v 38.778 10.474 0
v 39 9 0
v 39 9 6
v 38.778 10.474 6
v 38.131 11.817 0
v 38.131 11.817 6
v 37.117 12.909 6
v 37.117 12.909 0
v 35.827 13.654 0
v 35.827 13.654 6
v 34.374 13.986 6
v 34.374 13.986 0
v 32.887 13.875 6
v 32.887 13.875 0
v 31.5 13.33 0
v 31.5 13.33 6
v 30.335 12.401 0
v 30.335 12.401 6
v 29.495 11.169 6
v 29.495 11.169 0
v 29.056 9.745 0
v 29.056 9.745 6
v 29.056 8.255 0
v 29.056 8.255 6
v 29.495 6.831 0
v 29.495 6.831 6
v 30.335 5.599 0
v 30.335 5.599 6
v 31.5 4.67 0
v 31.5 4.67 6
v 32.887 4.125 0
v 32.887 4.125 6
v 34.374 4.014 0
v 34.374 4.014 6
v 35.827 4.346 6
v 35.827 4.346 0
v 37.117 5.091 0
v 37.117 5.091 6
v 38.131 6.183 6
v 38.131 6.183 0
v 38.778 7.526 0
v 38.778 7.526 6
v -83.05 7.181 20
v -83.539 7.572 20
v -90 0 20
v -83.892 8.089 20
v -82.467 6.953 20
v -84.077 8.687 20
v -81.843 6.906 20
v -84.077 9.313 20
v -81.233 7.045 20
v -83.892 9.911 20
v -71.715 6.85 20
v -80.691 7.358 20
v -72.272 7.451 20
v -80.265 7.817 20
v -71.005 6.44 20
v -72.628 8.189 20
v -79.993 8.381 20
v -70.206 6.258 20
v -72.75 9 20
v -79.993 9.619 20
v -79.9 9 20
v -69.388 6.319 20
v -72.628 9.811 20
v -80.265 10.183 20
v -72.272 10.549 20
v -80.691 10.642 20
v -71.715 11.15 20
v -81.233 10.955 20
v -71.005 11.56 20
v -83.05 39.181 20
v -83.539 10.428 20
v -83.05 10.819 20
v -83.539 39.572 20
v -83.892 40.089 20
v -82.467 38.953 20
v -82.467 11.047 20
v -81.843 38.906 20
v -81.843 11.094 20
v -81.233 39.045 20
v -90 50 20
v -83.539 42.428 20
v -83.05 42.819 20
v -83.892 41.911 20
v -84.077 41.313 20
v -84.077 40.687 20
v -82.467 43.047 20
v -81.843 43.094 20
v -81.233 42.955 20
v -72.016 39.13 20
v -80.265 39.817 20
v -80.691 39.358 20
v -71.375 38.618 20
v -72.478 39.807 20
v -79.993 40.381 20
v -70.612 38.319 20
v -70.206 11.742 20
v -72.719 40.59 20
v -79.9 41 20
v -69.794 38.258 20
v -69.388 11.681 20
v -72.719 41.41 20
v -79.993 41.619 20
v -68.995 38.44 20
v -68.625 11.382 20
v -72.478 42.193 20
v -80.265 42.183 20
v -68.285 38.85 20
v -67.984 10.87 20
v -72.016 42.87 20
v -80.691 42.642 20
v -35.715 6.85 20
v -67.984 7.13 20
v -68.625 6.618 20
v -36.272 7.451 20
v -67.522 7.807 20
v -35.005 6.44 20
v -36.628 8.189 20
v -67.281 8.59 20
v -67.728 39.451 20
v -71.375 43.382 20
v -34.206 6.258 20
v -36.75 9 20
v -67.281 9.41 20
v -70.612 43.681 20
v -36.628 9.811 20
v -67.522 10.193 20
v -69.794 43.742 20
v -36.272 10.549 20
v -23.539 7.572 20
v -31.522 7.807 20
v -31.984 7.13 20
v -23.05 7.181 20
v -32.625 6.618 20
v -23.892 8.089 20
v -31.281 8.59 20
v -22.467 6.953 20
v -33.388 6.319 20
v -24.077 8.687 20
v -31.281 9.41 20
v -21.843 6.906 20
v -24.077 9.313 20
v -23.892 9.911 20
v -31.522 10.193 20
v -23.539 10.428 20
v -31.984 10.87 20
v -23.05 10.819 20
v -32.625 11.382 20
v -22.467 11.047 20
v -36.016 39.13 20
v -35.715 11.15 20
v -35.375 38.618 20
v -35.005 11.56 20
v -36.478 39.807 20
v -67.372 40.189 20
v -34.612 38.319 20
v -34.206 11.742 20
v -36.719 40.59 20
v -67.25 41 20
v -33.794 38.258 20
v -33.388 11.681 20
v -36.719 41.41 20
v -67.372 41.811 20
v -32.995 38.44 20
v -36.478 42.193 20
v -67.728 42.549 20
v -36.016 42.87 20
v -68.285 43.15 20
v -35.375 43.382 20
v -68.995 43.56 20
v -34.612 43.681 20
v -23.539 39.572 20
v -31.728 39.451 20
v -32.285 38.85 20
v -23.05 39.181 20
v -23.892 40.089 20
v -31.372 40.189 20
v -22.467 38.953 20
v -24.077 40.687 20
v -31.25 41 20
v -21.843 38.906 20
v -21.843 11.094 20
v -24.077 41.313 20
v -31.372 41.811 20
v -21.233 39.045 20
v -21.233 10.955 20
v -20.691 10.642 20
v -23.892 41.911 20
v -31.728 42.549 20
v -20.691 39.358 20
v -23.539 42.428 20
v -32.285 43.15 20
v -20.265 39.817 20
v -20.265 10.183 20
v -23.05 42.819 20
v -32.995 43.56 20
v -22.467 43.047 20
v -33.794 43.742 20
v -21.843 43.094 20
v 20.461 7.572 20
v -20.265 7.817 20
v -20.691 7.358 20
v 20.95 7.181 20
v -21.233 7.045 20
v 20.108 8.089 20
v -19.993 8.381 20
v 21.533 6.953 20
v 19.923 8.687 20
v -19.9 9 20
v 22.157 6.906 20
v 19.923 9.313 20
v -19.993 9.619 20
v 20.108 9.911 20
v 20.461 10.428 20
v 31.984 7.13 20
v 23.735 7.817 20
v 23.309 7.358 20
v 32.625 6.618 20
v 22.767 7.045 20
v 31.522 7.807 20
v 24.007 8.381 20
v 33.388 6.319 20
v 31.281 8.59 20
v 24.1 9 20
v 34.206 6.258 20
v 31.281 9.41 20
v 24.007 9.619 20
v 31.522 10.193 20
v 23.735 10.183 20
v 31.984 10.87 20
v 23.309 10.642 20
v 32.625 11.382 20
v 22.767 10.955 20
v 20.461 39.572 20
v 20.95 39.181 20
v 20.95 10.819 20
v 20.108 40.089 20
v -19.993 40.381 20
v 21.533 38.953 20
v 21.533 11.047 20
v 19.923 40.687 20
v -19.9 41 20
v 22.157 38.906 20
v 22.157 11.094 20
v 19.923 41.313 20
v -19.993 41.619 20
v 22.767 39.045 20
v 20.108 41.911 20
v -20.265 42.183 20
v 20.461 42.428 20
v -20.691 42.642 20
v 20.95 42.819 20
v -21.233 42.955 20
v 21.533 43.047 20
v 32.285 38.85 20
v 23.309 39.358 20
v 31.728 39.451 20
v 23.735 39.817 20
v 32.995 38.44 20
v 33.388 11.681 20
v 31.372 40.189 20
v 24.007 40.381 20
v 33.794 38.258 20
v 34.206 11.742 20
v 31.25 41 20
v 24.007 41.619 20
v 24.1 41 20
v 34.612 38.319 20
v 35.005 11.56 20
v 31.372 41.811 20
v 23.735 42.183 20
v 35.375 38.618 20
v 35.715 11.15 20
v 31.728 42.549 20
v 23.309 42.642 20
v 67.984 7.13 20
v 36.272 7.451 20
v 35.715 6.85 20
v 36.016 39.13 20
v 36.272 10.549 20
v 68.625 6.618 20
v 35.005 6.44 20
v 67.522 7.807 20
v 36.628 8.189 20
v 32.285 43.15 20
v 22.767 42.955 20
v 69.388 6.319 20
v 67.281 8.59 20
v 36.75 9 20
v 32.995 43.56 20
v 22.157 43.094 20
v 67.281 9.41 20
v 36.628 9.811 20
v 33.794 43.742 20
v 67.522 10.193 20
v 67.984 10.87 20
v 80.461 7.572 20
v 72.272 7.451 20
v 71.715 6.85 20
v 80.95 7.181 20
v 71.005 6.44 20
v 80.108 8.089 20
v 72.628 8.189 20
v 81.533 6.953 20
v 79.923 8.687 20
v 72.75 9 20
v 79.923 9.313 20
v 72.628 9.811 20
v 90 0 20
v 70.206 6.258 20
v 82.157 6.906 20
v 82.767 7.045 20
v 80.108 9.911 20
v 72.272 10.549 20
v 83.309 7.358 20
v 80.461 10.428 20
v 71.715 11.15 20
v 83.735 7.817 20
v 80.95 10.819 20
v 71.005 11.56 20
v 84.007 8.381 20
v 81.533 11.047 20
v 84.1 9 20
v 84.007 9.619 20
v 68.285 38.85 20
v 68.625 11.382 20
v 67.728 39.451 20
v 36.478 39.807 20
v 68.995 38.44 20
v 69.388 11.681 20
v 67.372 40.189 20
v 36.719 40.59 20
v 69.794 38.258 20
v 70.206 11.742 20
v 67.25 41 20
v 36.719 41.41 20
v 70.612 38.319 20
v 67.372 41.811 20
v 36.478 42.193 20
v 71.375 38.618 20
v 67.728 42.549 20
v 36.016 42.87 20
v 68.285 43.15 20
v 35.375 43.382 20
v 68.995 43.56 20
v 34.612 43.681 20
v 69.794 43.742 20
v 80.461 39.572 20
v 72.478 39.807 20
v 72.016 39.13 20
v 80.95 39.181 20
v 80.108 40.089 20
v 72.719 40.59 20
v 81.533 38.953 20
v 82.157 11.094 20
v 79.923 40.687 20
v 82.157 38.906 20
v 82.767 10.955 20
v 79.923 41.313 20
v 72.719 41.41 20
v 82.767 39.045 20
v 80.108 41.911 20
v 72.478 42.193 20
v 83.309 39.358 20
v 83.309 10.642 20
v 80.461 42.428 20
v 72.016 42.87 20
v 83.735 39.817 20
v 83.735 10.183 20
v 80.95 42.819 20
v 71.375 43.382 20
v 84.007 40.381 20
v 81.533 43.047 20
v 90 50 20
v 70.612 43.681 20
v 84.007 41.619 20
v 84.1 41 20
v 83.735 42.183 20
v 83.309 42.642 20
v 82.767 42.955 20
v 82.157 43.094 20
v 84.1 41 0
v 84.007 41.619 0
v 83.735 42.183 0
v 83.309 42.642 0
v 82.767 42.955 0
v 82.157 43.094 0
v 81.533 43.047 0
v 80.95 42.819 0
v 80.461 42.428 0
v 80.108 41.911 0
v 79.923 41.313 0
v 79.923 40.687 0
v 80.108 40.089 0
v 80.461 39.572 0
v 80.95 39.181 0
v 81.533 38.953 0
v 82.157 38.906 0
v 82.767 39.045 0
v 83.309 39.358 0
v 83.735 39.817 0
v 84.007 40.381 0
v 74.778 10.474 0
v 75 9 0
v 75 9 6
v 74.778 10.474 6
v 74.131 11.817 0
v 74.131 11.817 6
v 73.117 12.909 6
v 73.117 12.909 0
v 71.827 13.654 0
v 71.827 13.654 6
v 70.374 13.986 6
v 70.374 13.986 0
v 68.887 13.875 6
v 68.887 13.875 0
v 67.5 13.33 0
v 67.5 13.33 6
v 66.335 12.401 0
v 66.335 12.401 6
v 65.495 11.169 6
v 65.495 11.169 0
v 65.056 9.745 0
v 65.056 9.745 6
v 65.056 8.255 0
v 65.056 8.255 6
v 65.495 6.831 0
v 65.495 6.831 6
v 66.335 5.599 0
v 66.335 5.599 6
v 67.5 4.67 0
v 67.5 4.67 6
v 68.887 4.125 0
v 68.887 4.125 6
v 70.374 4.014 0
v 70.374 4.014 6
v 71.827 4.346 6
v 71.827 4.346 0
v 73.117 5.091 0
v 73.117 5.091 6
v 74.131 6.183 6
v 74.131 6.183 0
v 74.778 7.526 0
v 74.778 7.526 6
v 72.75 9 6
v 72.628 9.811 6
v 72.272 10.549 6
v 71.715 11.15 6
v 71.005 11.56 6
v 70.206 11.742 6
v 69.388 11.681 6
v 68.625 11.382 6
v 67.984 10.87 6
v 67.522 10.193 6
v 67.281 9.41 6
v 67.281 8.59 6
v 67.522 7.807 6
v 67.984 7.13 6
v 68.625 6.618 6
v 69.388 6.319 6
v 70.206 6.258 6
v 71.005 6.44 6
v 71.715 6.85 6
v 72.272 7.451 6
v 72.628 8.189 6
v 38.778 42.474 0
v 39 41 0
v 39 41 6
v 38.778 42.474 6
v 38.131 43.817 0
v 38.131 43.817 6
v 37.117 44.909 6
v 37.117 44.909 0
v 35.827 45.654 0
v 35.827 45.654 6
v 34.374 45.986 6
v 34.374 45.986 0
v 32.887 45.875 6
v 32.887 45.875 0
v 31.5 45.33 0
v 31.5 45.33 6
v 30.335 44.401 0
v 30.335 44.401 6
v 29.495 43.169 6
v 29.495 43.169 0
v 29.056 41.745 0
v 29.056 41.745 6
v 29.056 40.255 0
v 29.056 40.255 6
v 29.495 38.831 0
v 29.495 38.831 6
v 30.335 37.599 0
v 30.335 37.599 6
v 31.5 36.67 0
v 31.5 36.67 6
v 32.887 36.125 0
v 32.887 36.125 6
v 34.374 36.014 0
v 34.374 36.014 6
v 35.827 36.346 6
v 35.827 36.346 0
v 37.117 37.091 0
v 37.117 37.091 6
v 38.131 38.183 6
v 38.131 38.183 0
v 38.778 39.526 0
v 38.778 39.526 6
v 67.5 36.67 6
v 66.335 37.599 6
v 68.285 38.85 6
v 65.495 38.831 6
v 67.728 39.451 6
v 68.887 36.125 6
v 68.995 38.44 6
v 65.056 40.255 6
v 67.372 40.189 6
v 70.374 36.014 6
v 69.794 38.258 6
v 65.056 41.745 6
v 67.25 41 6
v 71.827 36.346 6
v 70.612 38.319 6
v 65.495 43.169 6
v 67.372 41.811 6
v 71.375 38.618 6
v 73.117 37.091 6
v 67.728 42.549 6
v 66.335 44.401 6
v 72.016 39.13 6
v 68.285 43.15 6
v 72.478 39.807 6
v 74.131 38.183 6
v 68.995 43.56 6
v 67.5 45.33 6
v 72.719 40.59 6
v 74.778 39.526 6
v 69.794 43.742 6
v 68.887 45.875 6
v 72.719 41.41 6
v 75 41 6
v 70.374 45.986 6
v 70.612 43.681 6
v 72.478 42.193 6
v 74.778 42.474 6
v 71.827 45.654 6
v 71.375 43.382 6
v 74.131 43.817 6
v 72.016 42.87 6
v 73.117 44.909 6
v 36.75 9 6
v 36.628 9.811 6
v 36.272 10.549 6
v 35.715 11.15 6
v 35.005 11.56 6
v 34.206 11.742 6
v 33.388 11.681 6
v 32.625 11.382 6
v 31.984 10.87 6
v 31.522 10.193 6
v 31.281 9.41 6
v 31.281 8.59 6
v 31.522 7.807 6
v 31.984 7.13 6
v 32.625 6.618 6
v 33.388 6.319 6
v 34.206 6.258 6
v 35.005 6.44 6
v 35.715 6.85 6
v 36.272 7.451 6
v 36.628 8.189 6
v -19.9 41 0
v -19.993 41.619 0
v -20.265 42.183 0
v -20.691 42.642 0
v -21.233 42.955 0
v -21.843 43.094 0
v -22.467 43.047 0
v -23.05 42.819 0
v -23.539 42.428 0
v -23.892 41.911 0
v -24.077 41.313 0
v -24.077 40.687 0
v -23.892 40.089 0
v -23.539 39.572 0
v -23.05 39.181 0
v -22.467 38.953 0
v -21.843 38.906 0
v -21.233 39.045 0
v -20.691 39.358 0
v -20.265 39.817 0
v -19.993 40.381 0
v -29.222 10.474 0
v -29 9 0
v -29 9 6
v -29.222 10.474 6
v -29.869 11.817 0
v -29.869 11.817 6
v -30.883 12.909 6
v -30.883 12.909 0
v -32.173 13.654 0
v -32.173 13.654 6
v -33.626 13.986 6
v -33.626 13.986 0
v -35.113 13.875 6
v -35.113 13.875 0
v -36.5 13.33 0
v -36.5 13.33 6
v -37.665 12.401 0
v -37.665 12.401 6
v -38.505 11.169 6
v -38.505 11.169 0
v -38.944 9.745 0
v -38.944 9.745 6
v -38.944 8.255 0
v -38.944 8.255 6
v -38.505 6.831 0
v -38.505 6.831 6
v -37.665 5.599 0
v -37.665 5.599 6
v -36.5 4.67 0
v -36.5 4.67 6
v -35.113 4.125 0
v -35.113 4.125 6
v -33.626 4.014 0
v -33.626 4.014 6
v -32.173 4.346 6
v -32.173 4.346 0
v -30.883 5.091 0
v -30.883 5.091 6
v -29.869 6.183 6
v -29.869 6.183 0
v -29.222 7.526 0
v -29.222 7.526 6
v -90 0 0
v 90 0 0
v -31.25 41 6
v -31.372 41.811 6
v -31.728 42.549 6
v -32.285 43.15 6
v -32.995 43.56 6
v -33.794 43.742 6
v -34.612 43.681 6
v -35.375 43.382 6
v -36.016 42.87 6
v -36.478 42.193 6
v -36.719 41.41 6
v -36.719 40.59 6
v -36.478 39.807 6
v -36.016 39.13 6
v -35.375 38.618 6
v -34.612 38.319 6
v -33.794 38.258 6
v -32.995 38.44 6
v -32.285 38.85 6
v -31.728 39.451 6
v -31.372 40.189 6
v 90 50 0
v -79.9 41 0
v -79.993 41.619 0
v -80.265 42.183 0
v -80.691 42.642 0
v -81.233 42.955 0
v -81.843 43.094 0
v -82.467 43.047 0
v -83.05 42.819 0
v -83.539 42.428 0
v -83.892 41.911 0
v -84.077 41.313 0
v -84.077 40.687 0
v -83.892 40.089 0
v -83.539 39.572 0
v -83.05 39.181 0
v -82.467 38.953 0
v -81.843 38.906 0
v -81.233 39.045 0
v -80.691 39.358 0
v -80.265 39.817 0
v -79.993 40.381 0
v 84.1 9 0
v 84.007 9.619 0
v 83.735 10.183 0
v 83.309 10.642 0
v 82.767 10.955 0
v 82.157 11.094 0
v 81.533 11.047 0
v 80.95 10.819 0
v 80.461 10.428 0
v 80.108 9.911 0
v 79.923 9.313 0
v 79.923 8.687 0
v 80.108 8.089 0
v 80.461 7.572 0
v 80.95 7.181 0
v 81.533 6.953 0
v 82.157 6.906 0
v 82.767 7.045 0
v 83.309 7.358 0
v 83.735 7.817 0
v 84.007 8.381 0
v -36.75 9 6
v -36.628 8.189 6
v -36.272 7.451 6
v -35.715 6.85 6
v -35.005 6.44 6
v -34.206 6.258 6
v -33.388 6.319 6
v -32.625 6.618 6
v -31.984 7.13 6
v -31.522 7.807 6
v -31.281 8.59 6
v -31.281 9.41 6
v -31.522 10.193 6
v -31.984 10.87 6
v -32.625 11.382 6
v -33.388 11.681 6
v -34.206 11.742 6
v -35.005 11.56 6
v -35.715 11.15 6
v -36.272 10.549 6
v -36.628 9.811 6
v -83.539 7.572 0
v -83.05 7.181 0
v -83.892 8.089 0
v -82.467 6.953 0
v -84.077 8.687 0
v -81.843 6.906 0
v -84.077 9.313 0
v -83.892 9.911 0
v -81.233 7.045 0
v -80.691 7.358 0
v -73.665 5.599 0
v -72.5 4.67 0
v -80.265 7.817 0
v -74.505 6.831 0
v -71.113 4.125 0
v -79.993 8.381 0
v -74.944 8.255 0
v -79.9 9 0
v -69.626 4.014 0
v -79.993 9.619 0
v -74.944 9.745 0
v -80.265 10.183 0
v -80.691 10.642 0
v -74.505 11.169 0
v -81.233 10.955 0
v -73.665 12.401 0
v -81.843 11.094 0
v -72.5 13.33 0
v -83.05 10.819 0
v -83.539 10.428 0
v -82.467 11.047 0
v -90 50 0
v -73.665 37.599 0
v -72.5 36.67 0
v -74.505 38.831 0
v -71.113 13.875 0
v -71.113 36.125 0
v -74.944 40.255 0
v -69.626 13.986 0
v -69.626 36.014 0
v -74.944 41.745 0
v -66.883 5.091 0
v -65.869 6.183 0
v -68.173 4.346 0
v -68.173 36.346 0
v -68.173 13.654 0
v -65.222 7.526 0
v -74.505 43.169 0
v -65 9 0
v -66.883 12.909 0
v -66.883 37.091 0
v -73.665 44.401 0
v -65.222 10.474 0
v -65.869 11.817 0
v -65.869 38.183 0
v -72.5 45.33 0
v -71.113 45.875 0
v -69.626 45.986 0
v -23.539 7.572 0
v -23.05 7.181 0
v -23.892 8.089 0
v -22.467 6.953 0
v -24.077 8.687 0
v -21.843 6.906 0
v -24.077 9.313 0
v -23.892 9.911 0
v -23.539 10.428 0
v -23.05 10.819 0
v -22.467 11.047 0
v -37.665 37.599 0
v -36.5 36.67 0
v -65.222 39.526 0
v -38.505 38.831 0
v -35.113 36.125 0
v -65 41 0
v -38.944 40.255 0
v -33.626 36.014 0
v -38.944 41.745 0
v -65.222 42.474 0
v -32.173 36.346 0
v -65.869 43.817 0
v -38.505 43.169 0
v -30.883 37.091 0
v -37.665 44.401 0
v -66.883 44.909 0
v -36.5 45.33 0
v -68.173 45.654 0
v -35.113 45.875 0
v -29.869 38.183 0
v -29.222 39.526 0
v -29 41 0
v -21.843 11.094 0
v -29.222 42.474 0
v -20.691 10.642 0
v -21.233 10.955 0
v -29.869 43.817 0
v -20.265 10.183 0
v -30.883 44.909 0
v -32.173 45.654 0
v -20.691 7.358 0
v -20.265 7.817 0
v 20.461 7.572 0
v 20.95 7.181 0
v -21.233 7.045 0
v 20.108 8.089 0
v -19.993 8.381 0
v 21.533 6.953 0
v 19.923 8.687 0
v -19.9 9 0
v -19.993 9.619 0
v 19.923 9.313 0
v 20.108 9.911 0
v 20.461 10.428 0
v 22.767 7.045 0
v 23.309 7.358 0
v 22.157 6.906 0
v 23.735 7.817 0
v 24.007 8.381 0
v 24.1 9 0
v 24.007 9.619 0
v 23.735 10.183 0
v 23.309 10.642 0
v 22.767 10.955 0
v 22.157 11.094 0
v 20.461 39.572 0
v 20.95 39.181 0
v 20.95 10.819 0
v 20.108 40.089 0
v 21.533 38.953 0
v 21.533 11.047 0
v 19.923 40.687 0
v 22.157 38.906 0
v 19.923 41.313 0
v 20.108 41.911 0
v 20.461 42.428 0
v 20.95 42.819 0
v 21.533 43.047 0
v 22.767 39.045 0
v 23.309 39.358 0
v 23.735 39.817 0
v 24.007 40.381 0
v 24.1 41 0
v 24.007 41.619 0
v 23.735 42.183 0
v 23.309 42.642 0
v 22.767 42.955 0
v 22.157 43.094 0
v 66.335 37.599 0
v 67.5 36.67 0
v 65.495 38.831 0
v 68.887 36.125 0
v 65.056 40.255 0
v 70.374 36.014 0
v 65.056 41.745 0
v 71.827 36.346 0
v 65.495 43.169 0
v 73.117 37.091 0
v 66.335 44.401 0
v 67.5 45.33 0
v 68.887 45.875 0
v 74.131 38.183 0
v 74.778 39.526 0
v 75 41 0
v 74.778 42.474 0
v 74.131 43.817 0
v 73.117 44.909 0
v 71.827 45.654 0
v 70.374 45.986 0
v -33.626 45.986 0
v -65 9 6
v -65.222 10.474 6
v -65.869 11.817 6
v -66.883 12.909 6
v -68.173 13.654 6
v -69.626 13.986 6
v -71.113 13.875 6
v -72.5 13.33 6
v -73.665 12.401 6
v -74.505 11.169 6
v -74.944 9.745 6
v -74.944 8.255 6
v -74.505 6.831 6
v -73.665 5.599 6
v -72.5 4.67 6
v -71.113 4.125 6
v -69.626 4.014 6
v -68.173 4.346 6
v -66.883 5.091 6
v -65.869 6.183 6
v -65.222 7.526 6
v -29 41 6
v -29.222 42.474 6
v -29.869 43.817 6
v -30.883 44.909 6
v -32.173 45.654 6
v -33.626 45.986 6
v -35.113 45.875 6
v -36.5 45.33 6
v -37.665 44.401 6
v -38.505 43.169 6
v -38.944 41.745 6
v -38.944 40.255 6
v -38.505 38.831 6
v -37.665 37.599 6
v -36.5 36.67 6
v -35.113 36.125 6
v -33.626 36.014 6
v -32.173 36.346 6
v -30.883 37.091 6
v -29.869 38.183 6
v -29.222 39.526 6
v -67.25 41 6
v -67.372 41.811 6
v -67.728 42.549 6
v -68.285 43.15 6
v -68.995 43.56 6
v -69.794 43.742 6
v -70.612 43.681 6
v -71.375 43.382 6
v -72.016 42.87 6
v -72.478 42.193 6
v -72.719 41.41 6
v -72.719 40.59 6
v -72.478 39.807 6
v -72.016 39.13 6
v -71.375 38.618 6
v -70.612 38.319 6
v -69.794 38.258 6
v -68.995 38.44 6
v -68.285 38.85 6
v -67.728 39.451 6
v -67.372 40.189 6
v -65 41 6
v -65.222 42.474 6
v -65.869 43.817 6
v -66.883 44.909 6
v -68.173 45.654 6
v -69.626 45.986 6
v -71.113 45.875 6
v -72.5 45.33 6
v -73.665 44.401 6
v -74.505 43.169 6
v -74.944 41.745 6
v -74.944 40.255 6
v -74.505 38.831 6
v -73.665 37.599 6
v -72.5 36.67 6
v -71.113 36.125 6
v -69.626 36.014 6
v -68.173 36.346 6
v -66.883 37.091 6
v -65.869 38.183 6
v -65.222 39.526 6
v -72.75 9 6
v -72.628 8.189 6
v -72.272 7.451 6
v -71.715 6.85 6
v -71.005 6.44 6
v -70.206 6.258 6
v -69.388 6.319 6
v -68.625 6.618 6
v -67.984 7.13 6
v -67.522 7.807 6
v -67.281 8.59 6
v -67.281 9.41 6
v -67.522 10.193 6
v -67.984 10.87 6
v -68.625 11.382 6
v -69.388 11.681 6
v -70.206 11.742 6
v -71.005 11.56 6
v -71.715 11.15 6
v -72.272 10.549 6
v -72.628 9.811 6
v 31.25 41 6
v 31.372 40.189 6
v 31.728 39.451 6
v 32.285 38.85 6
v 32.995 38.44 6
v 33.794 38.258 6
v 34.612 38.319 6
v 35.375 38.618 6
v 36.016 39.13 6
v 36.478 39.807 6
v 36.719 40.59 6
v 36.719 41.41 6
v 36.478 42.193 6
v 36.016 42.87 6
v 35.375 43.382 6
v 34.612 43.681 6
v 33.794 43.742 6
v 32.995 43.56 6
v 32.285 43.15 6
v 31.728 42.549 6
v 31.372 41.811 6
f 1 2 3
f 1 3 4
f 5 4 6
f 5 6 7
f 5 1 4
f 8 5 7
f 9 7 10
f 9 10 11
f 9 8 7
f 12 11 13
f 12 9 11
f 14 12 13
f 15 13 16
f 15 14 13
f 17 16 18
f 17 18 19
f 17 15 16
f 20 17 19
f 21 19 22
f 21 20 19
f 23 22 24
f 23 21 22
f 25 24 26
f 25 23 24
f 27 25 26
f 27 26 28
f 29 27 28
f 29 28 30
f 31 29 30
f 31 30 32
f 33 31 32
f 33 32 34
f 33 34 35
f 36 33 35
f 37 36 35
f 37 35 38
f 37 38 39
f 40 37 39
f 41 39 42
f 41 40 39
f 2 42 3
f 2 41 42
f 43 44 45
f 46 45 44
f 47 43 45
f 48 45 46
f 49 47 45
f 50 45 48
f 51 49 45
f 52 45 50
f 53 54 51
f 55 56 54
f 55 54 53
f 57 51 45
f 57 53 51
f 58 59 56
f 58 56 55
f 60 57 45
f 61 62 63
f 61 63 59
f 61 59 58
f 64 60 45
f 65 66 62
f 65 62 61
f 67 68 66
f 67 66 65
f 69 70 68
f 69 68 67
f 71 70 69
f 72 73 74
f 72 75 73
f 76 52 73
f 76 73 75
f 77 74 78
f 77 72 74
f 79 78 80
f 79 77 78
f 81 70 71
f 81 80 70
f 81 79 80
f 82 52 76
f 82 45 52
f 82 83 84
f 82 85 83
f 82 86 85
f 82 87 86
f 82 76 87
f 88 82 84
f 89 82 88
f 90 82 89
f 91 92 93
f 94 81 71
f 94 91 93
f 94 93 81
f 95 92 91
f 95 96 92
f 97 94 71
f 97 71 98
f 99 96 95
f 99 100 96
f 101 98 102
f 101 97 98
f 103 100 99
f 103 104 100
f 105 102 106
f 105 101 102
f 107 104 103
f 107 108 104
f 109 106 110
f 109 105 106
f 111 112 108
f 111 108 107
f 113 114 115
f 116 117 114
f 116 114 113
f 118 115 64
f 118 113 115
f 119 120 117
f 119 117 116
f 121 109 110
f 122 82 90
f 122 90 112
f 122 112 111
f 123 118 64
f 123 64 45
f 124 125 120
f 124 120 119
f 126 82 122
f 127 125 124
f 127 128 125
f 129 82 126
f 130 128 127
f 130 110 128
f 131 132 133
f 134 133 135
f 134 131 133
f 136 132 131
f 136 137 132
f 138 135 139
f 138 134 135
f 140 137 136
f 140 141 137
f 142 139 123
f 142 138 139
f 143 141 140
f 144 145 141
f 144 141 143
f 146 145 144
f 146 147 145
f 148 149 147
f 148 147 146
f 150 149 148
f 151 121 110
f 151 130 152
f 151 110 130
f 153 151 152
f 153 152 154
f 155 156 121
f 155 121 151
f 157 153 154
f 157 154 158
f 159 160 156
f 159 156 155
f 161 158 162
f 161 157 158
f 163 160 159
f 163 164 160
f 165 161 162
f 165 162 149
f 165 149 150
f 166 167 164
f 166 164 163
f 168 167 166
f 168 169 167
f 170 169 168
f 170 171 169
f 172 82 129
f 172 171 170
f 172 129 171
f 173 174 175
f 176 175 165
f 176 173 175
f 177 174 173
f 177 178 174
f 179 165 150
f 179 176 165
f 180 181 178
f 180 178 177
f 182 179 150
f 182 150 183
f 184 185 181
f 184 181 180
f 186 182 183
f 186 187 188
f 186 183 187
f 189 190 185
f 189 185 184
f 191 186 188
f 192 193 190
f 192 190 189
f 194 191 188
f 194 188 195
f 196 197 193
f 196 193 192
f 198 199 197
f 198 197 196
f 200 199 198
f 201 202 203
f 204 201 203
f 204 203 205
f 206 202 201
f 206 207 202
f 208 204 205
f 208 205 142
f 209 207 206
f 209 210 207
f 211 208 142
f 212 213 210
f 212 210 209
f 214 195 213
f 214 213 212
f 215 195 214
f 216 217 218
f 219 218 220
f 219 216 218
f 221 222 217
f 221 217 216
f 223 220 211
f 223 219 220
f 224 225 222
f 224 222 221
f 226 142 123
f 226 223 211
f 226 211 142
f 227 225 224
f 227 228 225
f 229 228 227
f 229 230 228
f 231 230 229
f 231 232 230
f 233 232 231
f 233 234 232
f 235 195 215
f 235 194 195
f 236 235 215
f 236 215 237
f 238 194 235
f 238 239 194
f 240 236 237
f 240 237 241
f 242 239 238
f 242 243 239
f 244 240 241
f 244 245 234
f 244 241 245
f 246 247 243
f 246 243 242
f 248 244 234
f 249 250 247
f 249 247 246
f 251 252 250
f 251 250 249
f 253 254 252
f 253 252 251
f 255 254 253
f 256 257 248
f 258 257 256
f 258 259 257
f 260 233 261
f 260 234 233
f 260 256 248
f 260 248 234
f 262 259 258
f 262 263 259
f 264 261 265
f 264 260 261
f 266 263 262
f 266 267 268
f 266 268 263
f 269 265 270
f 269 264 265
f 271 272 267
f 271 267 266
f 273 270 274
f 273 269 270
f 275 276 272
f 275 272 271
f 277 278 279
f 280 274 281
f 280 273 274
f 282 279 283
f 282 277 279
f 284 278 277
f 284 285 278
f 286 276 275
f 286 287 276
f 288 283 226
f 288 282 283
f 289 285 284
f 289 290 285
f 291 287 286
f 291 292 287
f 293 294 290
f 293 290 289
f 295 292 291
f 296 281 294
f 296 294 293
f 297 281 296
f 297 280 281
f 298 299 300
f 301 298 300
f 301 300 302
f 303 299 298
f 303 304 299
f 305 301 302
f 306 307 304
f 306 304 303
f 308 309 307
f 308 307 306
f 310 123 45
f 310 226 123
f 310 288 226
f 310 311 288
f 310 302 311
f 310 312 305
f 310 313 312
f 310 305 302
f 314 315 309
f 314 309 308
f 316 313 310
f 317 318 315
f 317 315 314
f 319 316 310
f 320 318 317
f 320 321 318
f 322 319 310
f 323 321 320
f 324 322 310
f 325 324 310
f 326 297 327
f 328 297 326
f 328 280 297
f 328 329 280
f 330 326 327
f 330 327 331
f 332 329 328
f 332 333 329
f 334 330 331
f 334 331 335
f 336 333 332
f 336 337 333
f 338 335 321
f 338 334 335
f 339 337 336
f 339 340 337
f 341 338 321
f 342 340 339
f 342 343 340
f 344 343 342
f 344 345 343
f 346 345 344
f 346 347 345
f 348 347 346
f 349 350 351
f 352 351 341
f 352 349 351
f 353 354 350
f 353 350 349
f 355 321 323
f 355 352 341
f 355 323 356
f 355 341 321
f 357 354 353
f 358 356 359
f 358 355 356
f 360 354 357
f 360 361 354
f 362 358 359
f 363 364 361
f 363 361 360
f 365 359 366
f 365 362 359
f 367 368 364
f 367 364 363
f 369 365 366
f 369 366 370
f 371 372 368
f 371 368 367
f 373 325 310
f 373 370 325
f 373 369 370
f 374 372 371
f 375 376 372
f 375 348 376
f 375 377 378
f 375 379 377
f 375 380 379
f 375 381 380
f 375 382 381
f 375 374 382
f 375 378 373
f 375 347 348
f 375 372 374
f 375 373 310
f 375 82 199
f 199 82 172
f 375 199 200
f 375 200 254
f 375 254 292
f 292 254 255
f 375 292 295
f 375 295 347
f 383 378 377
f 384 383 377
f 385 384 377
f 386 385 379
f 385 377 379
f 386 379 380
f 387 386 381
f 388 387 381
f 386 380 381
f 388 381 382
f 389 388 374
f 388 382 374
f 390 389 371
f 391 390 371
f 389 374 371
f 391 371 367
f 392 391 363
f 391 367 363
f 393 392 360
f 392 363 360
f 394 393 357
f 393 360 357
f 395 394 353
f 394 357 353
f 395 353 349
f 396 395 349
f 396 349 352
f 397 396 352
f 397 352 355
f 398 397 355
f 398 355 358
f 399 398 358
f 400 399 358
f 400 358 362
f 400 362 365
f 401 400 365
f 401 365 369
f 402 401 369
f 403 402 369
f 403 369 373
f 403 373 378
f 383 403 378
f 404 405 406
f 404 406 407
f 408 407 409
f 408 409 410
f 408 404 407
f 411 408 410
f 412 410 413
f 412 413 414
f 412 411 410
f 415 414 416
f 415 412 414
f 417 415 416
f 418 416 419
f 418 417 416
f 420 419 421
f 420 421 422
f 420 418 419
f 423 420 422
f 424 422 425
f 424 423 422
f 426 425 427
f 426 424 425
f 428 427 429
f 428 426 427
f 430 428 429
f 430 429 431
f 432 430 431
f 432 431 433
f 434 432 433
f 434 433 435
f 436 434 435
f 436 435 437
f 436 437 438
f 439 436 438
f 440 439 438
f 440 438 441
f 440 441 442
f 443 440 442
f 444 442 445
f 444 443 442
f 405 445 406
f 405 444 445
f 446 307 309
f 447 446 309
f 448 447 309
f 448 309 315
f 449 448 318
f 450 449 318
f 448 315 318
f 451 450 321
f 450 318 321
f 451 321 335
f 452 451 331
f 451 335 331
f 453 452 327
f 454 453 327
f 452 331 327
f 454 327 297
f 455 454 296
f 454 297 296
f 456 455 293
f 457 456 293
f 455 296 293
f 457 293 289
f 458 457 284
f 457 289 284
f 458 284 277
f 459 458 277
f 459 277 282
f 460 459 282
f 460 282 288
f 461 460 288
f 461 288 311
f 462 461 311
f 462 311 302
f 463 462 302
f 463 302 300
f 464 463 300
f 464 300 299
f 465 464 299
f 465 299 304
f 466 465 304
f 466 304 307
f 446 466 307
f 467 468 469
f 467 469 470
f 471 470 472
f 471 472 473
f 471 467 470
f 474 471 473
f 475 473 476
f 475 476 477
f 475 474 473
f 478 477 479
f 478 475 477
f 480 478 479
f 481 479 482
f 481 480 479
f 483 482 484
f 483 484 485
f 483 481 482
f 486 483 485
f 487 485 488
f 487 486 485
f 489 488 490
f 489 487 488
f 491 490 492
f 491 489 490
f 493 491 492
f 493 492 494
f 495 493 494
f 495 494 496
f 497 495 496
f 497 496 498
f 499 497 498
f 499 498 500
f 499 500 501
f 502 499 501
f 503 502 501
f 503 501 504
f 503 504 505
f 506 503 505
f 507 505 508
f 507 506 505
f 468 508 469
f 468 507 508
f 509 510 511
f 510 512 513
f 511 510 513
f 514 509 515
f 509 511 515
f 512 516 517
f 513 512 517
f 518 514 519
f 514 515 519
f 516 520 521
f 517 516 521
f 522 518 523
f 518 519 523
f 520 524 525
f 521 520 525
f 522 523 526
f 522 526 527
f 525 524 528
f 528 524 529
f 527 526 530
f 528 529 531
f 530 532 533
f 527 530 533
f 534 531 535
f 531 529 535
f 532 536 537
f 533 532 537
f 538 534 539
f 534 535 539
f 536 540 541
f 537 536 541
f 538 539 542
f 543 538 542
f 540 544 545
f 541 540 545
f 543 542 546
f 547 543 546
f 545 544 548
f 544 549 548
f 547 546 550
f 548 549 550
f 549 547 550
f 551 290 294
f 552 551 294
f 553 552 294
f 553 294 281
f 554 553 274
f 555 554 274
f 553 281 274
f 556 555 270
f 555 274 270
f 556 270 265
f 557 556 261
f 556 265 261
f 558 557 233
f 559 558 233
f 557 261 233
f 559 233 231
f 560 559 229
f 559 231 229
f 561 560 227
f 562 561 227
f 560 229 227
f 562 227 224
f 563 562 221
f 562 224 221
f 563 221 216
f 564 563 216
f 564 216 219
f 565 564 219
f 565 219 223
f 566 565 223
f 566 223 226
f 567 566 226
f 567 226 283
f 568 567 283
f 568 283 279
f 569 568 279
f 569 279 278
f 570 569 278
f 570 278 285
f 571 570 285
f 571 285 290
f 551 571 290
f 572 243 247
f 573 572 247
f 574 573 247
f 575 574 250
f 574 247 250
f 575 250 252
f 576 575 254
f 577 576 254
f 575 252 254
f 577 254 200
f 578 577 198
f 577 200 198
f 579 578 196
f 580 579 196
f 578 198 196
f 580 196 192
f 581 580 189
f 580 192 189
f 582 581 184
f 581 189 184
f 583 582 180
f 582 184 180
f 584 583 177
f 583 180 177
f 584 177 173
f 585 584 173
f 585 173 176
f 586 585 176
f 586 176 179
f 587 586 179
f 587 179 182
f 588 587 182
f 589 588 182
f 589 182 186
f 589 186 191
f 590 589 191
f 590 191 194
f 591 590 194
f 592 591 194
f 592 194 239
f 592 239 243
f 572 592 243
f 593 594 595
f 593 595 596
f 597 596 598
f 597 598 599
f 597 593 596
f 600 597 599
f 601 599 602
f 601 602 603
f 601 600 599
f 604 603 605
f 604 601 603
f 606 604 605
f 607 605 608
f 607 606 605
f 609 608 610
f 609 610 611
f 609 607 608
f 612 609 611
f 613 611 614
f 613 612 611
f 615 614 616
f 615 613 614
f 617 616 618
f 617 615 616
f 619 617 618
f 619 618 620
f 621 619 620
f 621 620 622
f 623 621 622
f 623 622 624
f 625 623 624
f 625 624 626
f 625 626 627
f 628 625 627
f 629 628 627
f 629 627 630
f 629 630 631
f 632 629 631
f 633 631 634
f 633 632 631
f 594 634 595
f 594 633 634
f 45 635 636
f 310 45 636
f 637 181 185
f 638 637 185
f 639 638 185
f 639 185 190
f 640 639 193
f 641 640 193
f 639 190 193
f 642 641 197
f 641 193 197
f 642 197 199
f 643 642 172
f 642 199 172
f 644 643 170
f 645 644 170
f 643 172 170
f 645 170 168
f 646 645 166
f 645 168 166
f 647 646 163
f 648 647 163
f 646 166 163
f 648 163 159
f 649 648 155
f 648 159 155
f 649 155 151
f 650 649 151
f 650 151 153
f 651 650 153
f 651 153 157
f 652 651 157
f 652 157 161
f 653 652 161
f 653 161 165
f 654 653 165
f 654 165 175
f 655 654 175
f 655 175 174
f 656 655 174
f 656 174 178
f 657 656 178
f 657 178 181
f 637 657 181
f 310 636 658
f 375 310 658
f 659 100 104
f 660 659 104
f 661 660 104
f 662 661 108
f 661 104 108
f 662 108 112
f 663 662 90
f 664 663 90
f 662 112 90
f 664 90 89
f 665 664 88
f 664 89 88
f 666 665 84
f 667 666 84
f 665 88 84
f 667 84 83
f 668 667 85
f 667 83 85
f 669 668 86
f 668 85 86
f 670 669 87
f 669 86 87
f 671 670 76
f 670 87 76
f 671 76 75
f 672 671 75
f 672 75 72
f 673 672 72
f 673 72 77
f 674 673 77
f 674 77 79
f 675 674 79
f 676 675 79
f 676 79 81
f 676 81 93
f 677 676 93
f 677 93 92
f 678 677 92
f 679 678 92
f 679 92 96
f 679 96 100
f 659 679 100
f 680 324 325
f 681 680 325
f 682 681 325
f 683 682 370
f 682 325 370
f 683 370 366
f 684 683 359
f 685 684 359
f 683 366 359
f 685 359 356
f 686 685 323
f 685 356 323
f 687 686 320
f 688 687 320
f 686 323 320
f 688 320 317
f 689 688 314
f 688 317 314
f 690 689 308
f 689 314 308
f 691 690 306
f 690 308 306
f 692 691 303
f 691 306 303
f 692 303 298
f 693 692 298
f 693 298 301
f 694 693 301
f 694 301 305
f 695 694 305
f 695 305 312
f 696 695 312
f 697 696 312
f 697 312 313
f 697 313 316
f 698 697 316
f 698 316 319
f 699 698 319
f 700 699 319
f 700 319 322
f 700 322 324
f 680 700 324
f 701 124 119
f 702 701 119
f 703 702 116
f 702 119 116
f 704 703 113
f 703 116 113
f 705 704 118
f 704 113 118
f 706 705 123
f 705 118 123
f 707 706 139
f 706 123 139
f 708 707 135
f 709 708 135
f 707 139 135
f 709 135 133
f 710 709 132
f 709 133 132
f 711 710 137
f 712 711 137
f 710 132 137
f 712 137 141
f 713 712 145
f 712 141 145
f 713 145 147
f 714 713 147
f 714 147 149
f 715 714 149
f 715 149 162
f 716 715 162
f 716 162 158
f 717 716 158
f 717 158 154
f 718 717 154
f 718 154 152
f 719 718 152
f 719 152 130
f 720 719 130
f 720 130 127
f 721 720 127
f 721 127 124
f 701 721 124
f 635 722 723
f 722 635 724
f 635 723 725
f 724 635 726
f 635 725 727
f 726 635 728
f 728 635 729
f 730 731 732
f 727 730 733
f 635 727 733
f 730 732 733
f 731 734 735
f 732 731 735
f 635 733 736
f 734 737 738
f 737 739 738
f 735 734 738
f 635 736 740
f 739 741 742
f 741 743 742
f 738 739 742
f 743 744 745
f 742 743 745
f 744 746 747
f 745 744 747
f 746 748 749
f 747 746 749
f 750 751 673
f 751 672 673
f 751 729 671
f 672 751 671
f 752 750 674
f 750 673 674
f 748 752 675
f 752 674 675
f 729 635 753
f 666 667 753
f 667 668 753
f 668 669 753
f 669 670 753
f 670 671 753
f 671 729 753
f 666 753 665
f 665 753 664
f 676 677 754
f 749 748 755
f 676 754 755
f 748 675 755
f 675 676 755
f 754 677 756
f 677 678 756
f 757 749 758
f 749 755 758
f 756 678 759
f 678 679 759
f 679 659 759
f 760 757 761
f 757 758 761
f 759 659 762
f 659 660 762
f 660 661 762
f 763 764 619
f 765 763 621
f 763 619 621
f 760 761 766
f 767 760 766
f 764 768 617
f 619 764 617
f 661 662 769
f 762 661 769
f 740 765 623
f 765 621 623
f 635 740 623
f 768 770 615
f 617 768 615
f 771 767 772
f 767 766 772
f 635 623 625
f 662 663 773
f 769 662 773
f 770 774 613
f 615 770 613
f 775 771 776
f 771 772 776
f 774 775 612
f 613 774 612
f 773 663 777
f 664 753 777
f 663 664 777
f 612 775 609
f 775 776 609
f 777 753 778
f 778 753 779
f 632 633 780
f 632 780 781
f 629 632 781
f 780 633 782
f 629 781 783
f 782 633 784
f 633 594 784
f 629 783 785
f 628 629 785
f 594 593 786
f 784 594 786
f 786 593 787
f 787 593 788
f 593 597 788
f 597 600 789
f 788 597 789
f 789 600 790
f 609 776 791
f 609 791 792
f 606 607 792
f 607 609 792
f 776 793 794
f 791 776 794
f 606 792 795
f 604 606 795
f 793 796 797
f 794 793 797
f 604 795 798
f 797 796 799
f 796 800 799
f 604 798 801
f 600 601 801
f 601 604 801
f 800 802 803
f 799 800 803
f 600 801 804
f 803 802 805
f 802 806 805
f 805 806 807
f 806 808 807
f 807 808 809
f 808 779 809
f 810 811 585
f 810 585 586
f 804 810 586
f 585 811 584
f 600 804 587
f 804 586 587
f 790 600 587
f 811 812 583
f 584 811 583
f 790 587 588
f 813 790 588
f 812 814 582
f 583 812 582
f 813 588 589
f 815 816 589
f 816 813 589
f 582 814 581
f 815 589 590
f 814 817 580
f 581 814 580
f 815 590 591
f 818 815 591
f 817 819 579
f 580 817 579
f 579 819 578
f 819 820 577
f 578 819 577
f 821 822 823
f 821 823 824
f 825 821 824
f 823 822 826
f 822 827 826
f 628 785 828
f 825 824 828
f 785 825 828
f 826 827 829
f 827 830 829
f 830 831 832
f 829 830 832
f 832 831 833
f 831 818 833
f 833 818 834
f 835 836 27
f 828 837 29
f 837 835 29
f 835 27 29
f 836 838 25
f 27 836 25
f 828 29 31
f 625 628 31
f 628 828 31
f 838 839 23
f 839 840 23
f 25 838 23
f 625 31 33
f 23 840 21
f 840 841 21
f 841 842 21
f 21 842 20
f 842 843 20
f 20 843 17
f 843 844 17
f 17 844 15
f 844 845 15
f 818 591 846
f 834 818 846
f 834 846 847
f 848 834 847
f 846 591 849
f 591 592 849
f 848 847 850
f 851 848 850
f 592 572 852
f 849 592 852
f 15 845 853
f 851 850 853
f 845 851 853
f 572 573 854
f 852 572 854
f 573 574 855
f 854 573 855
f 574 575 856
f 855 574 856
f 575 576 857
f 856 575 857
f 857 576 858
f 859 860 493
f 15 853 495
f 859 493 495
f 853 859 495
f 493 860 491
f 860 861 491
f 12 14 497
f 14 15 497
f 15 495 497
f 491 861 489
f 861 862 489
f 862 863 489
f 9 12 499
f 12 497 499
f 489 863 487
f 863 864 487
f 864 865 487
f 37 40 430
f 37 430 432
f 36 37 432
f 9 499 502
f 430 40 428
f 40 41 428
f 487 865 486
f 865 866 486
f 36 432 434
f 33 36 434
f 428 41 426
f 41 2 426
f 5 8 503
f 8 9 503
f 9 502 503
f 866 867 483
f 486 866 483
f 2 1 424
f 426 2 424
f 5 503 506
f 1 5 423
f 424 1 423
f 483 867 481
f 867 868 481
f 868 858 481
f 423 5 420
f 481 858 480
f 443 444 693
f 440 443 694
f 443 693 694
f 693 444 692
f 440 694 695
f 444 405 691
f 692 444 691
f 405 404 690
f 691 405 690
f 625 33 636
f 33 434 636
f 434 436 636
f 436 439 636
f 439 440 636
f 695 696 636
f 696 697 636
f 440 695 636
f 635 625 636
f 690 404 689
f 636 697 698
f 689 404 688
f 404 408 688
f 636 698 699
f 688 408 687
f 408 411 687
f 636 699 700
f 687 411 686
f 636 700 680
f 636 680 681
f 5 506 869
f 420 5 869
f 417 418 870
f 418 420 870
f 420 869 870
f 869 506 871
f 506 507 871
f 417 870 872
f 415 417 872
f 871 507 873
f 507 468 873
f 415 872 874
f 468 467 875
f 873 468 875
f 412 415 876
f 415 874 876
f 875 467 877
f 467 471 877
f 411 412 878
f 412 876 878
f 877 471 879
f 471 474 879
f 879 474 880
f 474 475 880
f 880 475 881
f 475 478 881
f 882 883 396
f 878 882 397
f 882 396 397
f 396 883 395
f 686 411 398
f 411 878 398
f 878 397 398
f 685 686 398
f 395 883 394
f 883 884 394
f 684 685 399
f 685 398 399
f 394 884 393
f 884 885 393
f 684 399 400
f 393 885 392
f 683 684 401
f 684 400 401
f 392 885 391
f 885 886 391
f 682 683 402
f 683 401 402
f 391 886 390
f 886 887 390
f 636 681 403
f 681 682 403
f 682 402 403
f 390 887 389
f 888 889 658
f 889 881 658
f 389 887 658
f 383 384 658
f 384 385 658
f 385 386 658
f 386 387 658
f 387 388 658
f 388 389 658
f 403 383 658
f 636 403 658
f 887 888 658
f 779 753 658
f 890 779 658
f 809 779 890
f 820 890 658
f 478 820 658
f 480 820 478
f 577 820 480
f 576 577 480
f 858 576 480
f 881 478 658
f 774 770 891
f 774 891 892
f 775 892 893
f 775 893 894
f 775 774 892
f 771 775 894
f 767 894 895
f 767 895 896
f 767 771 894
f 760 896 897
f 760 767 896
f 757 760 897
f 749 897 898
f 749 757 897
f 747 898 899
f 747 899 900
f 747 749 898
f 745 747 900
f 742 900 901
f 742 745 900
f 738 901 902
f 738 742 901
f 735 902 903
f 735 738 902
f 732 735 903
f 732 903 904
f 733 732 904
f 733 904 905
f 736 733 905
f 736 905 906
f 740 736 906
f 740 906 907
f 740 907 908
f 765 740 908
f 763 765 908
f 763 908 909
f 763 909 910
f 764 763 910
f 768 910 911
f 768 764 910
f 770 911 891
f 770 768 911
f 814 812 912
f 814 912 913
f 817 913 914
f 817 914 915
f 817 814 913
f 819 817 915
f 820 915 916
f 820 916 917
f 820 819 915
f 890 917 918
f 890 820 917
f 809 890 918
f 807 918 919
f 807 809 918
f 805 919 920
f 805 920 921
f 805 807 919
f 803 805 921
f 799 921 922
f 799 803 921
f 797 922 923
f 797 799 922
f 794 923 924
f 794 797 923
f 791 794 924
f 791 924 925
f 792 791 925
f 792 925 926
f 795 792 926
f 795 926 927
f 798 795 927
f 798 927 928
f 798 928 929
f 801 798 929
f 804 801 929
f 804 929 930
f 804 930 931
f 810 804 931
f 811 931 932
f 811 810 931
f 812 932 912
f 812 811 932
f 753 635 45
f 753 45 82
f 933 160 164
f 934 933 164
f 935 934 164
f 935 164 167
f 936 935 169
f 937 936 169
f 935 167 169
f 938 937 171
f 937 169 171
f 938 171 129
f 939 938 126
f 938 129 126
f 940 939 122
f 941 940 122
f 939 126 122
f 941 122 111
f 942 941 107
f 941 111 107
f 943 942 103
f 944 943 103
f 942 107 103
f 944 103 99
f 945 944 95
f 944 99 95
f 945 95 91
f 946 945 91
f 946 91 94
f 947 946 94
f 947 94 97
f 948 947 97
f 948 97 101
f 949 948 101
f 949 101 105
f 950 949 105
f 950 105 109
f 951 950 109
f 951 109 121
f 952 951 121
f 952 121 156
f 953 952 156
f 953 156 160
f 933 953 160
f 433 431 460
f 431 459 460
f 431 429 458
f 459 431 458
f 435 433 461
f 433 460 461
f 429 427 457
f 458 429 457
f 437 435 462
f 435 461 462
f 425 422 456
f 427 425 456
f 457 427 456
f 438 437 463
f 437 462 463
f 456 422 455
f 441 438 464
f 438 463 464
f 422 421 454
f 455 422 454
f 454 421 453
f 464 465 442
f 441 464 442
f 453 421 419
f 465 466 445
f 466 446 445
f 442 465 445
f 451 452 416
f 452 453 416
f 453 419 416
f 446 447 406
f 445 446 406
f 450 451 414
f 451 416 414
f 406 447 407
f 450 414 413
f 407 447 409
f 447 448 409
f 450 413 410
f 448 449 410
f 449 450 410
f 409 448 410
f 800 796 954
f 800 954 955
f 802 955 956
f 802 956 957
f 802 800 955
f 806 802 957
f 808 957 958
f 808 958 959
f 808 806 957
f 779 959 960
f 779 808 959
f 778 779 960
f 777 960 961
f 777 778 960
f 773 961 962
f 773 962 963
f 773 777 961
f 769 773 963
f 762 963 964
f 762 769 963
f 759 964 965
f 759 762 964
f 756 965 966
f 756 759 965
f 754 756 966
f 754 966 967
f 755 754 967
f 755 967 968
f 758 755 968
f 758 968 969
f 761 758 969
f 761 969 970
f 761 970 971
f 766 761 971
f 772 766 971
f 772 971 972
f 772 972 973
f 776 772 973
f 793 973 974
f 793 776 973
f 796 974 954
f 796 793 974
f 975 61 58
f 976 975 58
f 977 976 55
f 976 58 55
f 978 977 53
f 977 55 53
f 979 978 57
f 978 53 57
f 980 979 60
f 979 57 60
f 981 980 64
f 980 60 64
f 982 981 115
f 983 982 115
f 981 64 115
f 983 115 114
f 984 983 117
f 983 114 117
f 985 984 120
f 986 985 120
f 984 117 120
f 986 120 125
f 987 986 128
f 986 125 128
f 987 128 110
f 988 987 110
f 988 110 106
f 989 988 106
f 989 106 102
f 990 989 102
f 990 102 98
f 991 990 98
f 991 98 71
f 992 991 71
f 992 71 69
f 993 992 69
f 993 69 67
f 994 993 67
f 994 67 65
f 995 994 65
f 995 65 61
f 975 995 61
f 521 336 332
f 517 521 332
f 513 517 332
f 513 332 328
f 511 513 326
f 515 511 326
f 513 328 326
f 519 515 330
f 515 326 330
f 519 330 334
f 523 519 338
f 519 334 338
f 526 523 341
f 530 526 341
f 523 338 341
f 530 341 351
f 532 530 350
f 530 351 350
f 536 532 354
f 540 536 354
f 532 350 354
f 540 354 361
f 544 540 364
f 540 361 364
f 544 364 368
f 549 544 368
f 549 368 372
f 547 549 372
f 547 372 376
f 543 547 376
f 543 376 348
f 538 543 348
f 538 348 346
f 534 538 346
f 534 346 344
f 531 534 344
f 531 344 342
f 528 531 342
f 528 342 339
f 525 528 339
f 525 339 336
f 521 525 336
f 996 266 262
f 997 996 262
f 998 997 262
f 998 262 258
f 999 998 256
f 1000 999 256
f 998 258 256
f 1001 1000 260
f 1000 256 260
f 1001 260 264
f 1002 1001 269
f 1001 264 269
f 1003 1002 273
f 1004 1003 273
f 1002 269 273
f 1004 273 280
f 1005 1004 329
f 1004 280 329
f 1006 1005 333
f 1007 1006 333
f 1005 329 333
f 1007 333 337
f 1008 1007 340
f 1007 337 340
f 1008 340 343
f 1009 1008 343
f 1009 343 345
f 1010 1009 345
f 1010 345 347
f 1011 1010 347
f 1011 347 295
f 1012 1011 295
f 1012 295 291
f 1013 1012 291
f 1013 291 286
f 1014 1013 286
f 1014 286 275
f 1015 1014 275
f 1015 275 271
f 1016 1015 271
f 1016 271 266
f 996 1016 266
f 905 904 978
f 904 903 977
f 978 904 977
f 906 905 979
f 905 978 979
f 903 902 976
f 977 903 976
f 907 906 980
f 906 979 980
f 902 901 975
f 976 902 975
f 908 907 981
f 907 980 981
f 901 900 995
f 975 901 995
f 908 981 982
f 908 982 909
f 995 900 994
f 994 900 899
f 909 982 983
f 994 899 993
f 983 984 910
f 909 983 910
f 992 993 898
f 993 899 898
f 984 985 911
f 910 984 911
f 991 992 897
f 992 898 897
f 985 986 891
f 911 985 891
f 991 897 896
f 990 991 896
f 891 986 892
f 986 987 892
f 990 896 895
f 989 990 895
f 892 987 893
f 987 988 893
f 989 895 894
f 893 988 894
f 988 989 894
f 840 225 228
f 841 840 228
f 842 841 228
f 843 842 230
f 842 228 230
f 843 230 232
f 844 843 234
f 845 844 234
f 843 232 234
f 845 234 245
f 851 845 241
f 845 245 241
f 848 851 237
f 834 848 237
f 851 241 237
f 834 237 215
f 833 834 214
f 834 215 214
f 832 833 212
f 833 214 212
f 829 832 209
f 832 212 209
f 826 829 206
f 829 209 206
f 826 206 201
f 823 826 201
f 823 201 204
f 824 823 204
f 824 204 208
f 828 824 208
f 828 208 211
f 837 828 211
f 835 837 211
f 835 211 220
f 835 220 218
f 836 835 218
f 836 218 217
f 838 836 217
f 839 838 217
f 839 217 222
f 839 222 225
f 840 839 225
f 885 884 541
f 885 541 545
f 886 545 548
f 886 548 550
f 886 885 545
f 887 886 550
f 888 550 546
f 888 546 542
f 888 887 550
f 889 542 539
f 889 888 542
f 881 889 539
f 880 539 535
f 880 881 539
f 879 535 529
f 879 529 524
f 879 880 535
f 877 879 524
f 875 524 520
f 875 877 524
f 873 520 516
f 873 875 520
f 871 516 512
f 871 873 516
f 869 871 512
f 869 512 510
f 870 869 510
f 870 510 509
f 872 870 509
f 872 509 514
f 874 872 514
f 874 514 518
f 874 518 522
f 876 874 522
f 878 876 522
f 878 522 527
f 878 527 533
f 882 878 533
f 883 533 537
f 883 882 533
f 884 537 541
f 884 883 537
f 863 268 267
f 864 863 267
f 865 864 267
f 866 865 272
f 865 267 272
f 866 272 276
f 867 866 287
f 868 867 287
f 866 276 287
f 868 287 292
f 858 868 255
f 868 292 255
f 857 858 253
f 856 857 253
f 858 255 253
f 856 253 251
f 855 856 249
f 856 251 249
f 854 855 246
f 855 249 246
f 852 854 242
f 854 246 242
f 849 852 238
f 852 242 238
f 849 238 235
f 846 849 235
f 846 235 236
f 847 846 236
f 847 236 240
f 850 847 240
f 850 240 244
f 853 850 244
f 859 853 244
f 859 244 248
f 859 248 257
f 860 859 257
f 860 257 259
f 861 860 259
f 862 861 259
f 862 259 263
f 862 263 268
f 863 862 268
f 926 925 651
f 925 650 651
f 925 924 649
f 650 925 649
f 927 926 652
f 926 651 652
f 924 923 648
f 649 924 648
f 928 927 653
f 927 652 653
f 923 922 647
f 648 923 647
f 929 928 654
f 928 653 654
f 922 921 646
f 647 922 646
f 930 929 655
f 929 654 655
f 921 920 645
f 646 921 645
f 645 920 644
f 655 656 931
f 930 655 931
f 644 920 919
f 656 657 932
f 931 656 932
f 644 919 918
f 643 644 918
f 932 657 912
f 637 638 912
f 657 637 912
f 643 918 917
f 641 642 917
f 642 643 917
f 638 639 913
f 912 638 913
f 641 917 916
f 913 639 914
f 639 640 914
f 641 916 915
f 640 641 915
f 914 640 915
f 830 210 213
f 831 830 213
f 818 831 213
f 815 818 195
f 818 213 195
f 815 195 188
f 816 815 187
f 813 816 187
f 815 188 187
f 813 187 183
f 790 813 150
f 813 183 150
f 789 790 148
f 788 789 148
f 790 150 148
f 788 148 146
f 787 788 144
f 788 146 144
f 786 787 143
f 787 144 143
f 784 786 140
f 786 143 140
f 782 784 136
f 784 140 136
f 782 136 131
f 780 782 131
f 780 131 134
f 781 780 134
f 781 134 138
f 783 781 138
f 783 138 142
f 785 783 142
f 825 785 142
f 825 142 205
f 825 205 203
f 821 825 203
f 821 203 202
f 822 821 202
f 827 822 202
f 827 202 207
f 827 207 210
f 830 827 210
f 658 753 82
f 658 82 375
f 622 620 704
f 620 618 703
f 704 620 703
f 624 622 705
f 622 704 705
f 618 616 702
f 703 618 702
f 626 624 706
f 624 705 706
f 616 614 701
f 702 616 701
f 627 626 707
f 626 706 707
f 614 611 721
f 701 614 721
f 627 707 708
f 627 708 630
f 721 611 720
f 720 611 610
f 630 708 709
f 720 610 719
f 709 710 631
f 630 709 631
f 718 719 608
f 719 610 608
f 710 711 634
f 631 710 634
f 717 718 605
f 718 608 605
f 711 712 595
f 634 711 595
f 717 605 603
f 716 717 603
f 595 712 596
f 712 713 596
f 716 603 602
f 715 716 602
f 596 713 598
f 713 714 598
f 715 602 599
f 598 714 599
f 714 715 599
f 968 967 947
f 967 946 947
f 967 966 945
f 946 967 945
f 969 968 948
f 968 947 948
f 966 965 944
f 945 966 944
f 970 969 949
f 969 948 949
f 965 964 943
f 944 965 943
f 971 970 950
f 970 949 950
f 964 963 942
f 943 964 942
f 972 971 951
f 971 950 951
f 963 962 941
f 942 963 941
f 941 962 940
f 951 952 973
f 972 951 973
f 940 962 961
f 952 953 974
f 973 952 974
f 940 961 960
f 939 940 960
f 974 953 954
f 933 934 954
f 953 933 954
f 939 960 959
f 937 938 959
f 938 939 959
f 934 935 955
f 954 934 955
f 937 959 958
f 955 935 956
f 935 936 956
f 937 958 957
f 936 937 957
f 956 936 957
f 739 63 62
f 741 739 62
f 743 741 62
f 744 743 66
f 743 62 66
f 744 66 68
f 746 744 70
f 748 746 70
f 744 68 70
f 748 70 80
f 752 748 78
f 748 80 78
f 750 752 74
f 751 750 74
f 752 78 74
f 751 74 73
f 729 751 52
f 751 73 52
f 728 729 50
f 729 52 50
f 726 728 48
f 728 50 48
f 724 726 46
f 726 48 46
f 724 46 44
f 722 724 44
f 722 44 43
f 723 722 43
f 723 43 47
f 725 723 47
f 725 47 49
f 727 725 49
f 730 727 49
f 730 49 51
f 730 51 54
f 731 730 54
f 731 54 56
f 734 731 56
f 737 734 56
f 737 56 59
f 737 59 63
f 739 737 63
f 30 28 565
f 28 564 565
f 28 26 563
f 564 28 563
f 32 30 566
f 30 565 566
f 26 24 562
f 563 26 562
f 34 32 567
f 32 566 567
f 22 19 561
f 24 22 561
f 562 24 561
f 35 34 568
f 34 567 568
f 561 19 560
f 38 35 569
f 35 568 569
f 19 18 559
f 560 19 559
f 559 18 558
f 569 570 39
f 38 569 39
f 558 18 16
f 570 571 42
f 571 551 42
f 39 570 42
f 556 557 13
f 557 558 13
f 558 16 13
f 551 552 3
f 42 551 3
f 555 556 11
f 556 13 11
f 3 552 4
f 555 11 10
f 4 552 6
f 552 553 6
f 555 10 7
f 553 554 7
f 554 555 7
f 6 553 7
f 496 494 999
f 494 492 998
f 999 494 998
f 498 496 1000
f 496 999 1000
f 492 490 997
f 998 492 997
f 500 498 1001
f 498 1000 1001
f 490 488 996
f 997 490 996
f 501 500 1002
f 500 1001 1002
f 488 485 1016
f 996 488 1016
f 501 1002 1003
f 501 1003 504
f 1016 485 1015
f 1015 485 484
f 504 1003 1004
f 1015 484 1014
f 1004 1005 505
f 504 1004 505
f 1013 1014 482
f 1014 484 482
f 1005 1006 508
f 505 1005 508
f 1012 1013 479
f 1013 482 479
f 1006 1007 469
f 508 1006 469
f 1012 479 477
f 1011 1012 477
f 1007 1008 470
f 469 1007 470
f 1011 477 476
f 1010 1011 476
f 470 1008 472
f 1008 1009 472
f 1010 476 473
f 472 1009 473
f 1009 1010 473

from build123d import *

# Parameters (mm, degrees)
SKIZZE1_W                            = 180
SKIZZE1_H                            = 50
AUFSATZ_LINEAR_AUSTRAGEN1_DEPTH      = 20
SKIZZE2_R                            = 2.75
SCHNITT_LINEAR_AUSTRAGEN1_DEPTH      = 40
SKIZZE3_R                            = 5
SCHNITT_LINEAR_AUSTRAGEN2_DEPTH      = 6
F_4_2_4_2_DURCHMESSER_BOHRUNG1_D     = 4.2
F_4_2_4_2_DURCHMESSER_BOHRUNG1_DEPTH = 34
F_4_2_4_2_DURCHMESSER_BOHRUNG1_TIP   = 1.2618073


with BuildPart() as part:
    # Skizze1 → Aufsatz-Linear austragen1 (new body)
    with BuildSketch(Plane.XY):
        with Locations((0, 25)):
            Rectangle(SKIZZE1_W, SKIZZE1_H)
    extrude(amount=AUFSATZ_LINEAR_AUSTRAGEN1_DEPTH)

    # Skizze2 → Schnitt-Linear austragen1 (cut)
    with BuildSketch(Plane.XY.offset(20)):
        with Locations((34, 9)):
            Circle(SKIZZE2_R)
        with Locations((70, 9)):
            Circle(SKIZZE2_R)
        with Locations(Location((70, 41, 0), (0, 0, 180))):
            Circle(SKIZZE2_R)
        with Locations(Location((34, 41, 0), (0, 0, 180))):
            Circle(SKIZZE2_R)
        with Locations(Location((-34, 9, 0), (0, 0, 180))):
            Circle(SKIZZE2_R)
        with Locations(Location((-70, 9, 0), (0, 0, 180))):
            Circle(SKIZZE2_R)
        with Locations((-70, 41)):
            Circle(SKIZZE2_R)
        with Locations((-34, 41)):
            Circle(SKIZZE2_R)
    extrude(amount=-SCHNITT_LINEAR_AUSTRAGEN1_DEPTH, mode=Mode.SUBTRACT)

    # Skizze3 → Schnitt-Linear austragen2 (cut)
    with BuildSketch(Plane.XY):
        with Locations((-70, 41)):
            Circle(SKIZZE3_R)
        with Locations((-34, 41)):
            Circle(SKIZZE3_R)
        with Locations((34, 41)):
            Circle(SKIZZE3_R)
        with Locations((70, 41)):
            Circle(SKIZZE3_R)
        with Locations((70, 9)):
            Circle(SKIZZE3_R)
        with Locations((34, 9)):
            Circle(SKIZZE3_R)
        with Locations((-34, 9)):
            Circle(SKIZZE3_R)
        with Locations((-70, 9)):
            Circle(SKIZZE3_R)
    extrude(amount=SCHNITT_LINEAR_AUSTRAGEN2_DEPTH, mode=Mode.SUBTRACT)

    # Ø4.2 (4.2) Durchmesser Bohrung1
    with Locations(Plane(origin=(0, 0, 0), x_dir=(-1, 0, 0), z_dir=(0, 0, -1))):
        with Locations((-22, 9), (82, 41), (22, 41), (82, 9), (22, 9), (-82, 9), (-82, 41), (-22, 41)):
            Hole(F_4_2_4_2_DURCHMESSER_BOHRUNG1_D / 2, depth=F_4_2_4_2_DURCHMESSER_BOHRUNG1_DEPTH)
            with Locations((0, 0, -(F_4_2_4_2_DURCHMESSER_BOHRUNG1_DEPTH + F_4_2_4_2_DURCHMESSER_BOHRUNG1_TIP / 2))):  # 118° drill point
                Cone(0, F_4_2_4_2_DURCHMESSER_BOHRUNG1_D / 2, F_4_2_4_2_DURCHMESSER_BOHRUNG1_TIP, mode=Mode.SUBTRACT)


solid = part.part
